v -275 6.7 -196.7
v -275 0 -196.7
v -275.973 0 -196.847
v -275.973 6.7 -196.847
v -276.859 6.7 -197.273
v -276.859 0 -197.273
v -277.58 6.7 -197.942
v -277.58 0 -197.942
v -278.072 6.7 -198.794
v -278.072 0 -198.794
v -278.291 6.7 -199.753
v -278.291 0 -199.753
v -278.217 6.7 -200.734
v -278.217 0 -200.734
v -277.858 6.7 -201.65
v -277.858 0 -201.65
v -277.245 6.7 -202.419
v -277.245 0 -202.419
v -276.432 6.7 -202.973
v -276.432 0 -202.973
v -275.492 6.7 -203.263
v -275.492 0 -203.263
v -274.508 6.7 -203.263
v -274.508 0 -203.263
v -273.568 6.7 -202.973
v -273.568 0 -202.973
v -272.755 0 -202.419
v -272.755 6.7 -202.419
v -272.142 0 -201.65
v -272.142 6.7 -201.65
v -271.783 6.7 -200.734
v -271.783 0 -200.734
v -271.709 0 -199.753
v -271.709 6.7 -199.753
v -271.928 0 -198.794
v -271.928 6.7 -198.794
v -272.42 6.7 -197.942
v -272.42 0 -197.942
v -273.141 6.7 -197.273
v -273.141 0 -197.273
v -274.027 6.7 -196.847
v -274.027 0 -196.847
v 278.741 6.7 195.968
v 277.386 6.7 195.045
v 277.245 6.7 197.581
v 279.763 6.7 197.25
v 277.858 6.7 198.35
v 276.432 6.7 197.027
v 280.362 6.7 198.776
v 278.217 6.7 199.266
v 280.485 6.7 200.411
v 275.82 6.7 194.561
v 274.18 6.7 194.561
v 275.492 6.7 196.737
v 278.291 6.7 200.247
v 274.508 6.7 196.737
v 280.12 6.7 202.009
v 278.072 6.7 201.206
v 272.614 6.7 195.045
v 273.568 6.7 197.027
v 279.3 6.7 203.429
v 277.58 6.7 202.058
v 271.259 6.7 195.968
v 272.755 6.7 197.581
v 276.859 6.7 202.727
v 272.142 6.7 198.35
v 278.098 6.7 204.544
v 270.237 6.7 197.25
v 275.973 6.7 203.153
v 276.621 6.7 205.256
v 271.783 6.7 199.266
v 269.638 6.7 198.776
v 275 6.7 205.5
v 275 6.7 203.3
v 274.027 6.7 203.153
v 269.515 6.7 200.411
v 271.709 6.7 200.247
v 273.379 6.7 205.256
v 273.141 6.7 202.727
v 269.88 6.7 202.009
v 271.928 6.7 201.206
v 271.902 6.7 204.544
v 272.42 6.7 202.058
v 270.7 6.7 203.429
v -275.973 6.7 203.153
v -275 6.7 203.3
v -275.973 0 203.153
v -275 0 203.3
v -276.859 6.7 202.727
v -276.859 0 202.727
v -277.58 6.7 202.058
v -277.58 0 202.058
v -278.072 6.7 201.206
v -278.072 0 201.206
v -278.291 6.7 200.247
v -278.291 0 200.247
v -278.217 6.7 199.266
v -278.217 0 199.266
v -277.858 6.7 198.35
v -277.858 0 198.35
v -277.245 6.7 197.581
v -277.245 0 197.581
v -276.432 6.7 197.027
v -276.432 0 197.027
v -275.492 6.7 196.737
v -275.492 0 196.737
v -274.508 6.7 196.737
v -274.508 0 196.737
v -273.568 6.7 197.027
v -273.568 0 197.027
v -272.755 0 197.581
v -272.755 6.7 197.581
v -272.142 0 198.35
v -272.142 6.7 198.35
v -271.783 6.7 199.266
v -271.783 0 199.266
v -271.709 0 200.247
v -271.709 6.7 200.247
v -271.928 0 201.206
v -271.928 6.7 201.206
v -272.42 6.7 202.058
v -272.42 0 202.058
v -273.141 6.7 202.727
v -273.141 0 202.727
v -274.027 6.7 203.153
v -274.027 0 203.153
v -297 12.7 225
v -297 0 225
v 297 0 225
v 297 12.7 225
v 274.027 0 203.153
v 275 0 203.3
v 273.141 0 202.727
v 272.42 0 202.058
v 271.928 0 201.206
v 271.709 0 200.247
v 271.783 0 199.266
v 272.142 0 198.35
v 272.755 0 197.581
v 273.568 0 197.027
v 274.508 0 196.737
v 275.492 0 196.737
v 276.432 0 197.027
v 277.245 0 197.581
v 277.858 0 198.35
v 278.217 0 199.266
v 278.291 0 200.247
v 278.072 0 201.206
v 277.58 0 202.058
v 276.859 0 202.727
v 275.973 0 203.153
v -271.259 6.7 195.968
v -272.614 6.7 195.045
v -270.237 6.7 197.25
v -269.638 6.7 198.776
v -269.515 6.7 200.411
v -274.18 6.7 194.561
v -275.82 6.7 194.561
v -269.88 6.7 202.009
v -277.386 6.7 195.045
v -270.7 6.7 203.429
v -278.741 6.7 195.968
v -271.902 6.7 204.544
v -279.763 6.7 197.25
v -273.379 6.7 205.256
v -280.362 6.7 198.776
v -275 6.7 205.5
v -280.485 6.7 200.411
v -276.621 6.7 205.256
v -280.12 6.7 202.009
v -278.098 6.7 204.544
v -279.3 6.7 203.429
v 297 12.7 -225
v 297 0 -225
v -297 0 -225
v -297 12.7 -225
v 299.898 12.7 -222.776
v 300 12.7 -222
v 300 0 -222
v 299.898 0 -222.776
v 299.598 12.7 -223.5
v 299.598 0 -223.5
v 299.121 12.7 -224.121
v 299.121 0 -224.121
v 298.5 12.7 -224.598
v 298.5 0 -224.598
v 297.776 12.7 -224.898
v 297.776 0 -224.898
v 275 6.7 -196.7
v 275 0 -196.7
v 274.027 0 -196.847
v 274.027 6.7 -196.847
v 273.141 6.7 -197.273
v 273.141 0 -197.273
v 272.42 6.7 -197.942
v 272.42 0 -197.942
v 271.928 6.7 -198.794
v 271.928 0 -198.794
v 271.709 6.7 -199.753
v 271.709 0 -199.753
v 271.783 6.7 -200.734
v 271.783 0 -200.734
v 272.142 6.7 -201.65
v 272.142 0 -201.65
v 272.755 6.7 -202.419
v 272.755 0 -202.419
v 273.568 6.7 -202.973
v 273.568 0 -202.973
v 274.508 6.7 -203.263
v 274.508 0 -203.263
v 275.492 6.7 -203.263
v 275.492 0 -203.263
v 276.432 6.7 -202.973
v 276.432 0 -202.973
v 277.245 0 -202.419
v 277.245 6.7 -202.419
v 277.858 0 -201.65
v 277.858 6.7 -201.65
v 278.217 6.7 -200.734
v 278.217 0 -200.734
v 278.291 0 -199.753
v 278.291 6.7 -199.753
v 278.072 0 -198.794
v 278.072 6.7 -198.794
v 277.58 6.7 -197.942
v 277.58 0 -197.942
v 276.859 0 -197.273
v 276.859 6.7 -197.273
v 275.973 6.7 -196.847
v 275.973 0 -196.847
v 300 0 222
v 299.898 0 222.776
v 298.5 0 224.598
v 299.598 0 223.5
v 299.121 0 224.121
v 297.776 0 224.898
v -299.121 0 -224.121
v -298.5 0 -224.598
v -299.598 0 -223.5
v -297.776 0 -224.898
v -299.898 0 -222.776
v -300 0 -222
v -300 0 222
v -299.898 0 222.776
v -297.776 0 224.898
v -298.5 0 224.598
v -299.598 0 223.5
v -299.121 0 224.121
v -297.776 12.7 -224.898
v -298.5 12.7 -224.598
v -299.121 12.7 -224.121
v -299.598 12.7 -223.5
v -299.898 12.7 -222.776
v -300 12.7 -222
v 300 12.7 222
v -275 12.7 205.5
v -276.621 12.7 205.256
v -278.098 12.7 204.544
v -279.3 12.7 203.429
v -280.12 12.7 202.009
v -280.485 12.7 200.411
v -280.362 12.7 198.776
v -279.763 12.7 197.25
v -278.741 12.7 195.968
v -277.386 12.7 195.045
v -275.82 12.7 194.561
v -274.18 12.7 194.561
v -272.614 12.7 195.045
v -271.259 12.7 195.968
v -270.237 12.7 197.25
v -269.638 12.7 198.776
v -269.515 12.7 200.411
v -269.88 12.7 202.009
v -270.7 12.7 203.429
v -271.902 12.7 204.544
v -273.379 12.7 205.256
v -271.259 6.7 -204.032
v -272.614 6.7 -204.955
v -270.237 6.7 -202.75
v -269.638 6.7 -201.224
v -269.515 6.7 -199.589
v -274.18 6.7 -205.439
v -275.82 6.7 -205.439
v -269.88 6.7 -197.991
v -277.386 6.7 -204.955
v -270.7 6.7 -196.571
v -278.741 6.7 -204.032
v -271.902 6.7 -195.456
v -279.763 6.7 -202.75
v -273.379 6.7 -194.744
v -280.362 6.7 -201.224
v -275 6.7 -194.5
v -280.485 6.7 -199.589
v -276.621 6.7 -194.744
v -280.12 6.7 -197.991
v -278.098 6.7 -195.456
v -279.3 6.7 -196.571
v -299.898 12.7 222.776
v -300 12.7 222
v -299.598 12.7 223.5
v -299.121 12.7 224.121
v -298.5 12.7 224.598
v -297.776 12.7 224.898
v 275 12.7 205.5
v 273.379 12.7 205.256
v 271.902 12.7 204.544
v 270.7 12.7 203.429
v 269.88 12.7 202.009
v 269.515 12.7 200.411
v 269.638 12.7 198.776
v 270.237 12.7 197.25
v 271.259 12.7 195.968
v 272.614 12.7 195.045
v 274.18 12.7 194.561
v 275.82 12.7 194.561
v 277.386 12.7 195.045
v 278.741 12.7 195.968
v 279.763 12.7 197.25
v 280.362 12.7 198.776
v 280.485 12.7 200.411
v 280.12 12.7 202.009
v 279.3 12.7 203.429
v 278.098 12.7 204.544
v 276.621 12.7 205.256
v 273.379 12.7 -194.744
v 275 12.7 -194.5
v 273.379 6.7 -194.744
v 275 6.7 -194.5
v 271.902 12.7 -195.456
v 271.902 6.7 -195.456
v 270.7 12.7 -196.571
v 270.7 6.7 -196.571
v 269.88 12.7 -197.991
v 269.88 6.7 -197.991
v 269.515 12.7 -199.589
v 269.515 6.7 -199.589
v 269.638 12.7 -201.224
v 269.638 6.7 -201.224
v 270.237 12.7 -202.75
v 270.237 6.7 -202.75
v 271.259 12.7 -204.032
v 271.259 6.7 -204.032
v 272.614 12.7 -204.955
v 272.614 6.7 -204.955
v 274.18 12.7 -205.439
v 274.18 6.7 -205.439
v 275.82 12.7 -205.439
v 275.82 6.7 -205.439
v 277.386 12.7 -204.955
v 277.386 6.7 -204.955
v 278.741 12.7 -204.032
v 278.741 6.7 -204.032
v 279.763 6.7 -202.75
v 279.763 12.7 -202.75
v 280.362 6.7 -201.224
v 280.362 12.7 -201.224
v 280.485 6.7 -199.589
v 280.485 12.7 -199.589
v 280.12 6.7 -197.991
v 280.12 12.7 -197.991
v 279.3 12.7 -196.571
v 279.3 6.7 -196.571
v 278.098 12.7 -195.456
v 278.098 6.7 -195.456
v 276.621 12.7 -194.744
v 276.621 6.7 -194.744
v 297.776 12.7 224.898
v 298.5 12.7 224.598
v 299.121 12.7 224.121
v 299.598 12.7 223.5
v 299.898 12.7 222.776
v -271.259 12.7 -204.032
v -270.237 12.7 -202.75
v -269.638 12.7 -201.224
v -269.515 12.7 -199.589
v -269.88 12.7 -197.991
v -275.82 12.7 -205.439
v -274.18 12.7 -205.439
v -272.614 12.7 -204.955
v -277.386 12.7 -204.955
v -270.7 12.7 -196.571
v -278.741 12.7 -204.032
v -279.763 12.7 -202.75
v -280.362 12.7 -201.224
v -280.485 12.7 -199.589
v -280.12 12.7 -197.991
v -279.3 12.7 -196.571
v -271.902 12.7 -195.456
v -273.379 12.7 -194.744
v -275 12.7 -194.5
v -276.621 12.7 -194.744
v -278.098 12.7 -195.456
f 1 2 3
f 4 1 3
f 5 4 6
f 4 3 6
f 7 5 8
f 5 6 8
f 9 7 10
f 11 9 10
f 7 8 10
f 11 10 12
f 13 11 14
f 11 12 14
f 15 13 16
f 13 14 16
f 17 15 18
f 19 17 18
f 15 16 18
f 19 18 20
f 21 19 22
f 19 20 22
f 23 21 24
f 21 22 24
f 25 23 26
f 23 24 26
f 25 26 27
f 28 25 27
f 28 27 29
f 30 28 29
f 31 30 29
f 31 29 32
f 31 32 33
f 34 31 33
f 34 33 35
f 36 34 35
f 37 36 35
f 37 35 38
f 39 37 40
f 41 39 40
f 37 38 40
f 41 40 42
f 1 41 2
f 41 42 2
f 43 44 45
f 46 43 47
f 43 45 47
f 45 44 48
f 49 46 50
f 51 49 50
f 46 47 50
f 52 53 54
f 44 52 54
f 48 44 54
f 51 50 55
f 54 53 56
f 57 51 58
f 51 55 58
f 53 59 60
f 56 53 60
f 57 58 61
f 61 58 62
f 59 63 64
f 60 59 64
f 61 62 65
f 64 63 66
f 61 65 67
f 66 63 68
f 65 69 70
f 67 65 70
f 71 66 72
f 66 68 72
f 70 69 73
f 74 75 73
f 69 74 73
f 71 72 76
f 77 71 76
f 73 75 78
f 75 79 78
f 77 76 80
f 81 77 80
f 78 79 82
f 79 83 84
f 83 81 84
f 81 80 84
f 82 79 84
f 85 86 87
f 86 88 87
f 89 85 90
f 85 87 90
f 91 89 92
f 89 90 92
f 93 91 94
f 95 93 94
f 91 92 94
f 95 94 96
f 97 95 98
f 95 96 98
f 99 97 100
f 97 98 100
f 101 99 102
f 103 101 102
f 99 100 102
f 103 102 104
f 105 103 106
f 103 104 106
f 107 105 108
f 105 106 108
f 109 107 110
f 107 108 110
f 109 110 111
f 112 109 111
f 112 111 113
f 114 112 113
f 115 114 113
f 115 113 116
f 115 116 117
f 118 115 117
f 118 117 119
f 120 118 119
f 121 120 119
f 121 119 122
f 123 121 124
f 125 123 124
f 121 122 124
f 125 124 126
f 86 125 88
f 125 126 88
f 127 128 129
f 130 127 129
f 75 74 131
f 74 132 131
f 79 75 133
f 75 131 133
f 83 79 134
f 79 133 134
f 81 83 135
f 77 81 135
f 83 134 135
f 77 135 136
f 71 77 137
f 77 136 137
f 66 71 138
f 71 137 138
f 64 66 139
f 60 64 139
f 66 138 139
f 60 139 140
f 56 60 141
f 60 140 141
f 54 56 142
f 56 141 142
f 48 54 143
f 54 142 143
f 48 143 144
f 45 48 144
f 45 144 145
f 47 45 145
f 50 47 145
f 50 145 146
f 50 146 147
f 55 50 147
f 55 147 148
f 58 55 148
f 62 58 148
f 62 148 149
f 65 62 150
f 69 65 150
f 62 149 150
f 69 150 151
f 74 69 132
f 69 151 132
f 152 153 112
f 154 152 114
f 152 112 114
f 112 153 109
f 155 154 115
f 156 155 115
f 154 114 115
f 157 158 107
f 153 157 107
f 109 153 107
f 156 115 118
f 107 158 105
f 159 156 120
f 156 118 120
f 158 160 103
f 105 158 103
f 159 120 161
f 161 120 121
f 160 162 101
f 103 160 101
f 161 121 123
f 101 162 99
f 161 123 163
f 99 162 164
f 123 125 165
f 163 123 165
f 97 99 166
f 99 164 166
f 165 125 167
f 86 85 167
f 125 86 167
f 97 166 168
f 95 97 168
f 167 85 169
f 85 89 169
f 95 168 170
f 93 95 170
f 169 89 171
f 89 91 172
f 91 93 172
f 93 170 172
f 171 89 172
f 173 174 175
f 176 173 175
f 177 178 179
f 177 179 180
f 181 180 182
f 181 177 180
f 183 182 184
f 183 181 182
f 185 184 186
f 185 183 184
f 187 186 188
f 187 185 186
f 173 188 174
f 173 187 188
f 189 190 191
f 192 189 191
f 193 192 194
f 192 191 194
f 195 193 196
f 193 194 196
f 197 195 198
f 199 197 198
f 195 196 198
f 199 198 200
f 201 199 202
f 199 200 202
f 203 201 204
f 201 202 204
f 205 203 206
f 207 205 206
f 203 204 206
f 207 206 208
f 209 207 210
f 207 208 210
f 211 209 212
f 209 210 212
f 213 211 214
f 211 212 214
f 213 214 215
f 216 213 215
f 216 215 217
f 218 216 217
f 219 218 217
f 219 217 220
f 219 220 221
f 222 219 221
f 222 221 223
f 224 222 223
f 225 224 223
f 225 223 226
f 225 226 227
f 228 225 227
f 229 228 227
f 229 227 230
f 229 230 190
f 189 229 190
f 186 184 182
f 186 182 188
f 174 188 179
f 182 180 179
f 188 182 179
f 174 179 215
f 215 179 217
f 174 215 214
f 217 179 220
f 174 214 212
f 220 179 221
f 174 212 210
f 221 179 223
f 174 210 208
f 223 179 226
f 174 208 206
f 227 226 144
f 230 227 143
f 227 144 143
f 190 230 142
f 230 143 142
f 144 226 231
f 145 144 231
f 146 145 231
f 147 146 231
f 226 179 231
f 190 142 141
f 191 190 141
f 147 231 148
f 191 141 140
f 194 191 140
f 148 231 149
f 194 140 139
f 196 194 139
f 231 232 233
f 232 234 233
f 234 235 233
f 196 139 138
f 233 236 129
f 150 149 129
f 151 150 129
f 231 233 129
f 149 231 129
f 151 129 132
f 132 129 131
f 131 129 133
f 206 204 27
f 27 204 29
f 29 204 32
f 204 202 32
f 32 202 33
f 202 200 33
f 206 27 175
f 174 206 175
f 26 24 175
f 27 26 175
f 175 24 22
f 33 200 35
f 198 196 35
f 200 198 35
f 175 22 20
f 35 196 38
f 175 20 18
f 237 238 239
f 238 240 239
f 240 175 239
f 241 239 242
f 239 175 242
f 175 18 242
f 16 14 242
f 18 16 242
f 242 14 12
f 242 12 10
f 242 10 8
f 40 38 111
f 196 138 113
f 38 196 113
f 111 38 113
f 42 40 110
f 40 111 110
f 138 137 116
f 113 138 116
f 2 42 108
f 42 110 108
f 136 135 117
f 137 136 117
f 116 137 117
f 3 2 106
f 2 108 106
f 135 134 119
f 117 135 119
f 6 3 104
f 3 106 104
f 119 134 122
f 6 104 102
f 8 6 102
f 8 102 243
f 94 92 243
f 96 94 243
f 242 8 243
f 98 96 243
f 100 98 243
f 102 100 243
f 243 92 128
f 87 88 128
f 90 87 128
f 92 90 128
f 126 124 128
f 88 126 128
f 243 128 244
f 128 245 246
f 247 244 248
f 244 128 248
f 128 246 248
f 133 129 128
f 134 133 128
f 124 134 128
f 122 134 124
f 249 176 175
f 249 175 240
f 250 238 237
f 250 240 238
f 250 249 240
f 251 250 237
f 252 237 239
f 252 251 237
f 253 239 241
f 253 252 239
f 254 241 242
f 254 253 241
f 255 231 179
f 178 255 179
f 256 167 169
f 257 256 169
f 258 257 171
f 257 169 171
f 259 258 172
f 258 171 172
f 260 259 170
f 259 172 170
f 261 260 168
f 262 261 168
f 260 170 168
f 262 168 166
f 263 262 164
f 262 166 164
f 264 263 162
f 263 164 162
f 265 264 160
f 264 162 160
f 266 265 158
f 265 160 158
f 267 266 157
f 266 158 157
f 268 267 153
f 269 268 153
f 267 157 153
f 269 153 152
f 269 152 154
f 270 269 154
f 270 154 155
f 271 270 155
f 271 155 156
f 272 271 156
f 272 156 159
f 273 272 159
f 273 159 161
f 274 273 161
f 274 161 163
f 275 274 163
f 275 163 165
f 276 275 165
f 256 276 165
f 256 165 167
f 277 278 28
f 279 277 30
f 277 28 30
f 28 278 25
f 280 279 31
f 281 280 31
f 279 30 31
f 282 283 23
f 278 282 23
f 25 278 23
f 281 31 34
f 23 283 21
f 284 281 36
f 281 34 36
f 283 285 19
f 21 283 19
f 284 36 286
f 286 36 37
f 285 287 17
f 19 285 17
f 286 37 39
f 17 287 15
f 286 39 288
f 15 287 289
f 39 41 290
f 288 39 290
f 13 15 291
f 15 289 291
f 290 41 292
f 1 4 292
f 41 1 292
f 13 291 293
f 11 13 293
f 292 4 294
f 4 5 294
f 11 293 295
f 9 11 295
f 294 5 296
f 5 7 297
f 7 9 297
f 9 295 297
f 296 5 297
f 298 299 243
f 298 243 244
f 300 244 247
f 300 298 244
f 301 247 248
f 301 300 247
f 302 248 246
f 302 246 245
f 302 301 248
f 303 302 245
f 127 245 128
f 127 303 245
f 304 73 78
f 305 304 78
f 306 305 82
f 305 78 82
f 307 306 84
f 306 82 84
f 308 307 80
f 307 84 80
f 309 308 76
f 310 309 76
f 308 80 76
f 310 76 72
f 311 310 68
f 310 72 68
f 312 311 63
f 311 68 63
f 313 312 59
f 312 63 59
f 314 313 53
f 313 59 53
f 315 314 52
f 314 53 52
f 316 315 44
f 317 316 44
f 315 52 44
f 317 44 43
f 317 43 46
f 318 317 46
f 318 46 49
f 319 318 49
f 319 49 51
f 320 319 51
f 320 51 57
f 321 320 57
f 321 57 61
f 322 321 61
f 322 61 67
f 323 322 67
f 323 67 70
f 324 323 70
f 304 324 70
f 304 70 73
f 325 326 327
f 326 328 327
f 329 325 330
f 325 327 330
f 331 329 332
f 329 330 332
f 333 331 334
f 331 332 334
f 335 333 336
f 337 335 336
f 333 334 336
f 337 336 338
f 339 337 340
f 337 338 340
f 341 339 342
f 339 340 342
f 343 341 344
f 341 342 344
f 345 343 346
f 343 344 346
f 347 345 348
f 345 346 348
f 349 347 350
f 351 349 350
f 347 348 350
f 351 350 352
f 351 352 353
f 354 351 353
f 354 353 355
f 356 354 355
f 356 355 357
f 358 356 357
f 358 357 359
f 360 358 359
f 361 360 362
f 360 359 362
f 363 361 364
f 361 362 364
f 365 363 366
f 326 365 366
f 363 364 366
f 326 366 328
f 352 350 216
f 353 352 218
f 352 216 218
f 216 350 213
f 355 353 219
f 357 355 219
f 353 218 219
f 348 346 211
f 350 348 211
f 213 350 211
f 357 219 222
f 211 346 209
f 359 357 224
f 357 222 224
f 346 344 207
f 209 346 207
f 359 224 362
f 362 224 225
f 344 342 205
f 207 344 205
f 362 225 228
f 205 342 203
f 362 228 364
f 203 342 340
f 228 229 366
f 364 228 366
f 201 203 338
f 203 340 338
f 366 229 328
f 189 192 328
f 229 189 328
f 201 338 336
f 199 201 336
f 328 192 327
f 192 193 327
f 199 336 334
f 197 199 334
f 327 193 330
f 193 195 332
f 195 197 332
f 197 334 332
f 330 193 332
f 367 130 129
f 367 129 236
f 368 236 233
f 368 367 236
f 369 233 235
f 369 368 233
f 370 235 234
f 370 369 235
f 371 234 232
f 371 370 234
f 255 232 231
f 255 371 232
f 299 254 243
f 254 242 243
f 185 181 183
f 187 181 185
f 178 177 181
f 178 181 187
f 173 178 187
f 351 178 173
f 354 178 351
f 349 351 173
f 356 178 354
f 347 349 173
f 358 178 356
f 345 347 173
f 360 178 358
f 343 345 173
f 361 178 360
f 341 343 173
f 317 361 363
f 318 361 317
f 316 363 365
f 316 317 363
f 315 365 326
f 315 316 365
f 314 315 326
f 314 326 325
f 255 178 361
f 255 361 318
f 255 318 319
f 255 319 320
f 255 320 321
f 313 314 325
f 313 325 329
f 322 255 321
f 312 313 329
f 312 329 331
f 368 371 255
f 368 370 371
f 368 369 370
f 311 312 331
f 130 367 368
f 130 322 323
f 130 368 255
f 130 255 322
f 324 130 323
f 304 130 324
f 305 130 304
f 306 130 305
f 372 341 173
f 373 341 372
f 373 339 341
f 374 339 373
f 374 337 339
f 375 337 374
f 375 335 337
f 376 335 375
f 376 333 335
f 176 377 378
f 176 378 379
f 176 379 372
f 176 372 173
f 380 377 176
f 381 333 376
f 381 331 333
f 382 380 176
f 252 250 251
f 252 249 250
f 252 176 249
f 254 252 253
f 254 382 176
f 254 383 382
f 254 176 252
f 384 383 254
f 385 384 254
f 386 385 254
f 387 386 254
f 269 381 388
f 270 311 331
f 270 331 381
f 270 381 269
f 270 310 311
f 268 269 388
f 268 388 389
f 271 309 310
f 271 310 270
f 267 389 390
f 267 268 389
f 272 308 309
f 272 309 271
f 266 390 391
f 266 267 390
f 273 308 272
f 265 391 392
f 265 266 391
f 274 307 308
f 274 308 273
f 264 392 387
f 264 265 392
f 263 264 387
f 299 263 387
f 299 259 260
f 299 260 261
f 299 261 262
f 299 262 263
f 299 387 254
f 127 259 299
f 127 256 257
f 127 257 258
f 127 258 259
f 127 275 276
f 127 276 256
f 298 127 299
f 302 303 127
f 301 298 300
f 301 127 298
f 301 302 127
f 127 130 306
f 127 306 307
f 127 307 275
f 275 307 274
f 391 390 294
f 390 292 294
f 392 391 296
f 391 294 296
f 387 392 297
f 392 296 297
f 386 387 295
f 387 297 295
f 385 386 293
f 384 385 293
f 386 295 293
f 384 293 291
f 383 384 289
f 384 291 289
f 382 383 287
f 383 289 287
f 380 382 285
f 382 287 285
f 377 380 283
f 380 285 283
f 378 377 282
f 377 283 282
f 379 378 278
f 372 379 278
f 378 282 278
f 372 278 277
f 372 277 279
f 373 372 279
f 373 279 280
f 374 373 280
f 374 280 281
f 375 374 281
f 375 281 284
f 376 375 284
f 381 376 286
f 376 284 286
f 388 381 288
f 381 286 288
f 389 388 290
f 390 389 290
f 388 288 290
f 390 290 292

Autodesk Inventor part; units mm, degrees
ref_plane "YZ Plane" through (0, 0, 0) normal (1, 0, 0) x (0, 1, 0)
ref_plane "XZ Plane" through (0, 0, 0) normal (0, 1, 0) x (-1, 0, 0)
ref_plane "XY Plane" through (0, 0, 0) normal (0, 0, 1) x (1, 0, 0)
sketch "Sketch1" plane through (0, 0, 0) normal (0, 1, 0) x (-1, 0, 0)
  line L0 (300, 225) -> (-300, 225)
  line L1 (-300, 225) -> (-300, -225)
  line L2 (-300, -225) -> (300, -225)
  line L3 (300, -225) -> (300, 225)
  line L4 (300, 225) -> (-300, -225) construction
  line L5 (-300, 225) -> (300, -225) construction
  point P0 (0, 0)
  dimension "d0" = 600
  dimension "d1" = 450
extrude "Extrusion1" add sketch "Sketch1" along normal blind 12.7
fillet "Fillet1" radius 3 4 edges at (300, 6.35, 225) (300, 6.35, -225) (-300, 6.35, 225) (-300, 6.35, -225)
sketch "Sketch2" plane through (0, 12.7, 0) normal (0, 1, 0) x (1, 0, 0)
  line L0 (-300, 222) -> (-300, -222) projected
  line L1 (297, 225) -> (-297, 225) projected
  line L2 (-297, -225) -> (297, -225) projected
  line L3 (300, -222) -> (300, 222) projected
  line L4 (0, 225) -> (0, -225) construction
  line L5 (-300, 0) -> (300, 0) construction
  point P0 (0, 0)
  point P1 (-275, 200)
  point P2 (275, 200)
  point P3 (-275, -200)
  point P4 (275, -200)
  dimension "d5" = 25
  dimension "d6" = 25
hole "Hole1" at (-275, 12.7, -200) at (275, 12.7, -200) at (275, 12.7, 200) at (-275, 12.7, 200) direction (0, -1, 0) diameter 6.6 end through all counterbore diameter 11 counterbore depth 6 clearance for "Socket Head Cap Screw" size "M6" standard "Ansi Metric M Profile"
properties part number "Breadboard" material "Aluminum 6061"
